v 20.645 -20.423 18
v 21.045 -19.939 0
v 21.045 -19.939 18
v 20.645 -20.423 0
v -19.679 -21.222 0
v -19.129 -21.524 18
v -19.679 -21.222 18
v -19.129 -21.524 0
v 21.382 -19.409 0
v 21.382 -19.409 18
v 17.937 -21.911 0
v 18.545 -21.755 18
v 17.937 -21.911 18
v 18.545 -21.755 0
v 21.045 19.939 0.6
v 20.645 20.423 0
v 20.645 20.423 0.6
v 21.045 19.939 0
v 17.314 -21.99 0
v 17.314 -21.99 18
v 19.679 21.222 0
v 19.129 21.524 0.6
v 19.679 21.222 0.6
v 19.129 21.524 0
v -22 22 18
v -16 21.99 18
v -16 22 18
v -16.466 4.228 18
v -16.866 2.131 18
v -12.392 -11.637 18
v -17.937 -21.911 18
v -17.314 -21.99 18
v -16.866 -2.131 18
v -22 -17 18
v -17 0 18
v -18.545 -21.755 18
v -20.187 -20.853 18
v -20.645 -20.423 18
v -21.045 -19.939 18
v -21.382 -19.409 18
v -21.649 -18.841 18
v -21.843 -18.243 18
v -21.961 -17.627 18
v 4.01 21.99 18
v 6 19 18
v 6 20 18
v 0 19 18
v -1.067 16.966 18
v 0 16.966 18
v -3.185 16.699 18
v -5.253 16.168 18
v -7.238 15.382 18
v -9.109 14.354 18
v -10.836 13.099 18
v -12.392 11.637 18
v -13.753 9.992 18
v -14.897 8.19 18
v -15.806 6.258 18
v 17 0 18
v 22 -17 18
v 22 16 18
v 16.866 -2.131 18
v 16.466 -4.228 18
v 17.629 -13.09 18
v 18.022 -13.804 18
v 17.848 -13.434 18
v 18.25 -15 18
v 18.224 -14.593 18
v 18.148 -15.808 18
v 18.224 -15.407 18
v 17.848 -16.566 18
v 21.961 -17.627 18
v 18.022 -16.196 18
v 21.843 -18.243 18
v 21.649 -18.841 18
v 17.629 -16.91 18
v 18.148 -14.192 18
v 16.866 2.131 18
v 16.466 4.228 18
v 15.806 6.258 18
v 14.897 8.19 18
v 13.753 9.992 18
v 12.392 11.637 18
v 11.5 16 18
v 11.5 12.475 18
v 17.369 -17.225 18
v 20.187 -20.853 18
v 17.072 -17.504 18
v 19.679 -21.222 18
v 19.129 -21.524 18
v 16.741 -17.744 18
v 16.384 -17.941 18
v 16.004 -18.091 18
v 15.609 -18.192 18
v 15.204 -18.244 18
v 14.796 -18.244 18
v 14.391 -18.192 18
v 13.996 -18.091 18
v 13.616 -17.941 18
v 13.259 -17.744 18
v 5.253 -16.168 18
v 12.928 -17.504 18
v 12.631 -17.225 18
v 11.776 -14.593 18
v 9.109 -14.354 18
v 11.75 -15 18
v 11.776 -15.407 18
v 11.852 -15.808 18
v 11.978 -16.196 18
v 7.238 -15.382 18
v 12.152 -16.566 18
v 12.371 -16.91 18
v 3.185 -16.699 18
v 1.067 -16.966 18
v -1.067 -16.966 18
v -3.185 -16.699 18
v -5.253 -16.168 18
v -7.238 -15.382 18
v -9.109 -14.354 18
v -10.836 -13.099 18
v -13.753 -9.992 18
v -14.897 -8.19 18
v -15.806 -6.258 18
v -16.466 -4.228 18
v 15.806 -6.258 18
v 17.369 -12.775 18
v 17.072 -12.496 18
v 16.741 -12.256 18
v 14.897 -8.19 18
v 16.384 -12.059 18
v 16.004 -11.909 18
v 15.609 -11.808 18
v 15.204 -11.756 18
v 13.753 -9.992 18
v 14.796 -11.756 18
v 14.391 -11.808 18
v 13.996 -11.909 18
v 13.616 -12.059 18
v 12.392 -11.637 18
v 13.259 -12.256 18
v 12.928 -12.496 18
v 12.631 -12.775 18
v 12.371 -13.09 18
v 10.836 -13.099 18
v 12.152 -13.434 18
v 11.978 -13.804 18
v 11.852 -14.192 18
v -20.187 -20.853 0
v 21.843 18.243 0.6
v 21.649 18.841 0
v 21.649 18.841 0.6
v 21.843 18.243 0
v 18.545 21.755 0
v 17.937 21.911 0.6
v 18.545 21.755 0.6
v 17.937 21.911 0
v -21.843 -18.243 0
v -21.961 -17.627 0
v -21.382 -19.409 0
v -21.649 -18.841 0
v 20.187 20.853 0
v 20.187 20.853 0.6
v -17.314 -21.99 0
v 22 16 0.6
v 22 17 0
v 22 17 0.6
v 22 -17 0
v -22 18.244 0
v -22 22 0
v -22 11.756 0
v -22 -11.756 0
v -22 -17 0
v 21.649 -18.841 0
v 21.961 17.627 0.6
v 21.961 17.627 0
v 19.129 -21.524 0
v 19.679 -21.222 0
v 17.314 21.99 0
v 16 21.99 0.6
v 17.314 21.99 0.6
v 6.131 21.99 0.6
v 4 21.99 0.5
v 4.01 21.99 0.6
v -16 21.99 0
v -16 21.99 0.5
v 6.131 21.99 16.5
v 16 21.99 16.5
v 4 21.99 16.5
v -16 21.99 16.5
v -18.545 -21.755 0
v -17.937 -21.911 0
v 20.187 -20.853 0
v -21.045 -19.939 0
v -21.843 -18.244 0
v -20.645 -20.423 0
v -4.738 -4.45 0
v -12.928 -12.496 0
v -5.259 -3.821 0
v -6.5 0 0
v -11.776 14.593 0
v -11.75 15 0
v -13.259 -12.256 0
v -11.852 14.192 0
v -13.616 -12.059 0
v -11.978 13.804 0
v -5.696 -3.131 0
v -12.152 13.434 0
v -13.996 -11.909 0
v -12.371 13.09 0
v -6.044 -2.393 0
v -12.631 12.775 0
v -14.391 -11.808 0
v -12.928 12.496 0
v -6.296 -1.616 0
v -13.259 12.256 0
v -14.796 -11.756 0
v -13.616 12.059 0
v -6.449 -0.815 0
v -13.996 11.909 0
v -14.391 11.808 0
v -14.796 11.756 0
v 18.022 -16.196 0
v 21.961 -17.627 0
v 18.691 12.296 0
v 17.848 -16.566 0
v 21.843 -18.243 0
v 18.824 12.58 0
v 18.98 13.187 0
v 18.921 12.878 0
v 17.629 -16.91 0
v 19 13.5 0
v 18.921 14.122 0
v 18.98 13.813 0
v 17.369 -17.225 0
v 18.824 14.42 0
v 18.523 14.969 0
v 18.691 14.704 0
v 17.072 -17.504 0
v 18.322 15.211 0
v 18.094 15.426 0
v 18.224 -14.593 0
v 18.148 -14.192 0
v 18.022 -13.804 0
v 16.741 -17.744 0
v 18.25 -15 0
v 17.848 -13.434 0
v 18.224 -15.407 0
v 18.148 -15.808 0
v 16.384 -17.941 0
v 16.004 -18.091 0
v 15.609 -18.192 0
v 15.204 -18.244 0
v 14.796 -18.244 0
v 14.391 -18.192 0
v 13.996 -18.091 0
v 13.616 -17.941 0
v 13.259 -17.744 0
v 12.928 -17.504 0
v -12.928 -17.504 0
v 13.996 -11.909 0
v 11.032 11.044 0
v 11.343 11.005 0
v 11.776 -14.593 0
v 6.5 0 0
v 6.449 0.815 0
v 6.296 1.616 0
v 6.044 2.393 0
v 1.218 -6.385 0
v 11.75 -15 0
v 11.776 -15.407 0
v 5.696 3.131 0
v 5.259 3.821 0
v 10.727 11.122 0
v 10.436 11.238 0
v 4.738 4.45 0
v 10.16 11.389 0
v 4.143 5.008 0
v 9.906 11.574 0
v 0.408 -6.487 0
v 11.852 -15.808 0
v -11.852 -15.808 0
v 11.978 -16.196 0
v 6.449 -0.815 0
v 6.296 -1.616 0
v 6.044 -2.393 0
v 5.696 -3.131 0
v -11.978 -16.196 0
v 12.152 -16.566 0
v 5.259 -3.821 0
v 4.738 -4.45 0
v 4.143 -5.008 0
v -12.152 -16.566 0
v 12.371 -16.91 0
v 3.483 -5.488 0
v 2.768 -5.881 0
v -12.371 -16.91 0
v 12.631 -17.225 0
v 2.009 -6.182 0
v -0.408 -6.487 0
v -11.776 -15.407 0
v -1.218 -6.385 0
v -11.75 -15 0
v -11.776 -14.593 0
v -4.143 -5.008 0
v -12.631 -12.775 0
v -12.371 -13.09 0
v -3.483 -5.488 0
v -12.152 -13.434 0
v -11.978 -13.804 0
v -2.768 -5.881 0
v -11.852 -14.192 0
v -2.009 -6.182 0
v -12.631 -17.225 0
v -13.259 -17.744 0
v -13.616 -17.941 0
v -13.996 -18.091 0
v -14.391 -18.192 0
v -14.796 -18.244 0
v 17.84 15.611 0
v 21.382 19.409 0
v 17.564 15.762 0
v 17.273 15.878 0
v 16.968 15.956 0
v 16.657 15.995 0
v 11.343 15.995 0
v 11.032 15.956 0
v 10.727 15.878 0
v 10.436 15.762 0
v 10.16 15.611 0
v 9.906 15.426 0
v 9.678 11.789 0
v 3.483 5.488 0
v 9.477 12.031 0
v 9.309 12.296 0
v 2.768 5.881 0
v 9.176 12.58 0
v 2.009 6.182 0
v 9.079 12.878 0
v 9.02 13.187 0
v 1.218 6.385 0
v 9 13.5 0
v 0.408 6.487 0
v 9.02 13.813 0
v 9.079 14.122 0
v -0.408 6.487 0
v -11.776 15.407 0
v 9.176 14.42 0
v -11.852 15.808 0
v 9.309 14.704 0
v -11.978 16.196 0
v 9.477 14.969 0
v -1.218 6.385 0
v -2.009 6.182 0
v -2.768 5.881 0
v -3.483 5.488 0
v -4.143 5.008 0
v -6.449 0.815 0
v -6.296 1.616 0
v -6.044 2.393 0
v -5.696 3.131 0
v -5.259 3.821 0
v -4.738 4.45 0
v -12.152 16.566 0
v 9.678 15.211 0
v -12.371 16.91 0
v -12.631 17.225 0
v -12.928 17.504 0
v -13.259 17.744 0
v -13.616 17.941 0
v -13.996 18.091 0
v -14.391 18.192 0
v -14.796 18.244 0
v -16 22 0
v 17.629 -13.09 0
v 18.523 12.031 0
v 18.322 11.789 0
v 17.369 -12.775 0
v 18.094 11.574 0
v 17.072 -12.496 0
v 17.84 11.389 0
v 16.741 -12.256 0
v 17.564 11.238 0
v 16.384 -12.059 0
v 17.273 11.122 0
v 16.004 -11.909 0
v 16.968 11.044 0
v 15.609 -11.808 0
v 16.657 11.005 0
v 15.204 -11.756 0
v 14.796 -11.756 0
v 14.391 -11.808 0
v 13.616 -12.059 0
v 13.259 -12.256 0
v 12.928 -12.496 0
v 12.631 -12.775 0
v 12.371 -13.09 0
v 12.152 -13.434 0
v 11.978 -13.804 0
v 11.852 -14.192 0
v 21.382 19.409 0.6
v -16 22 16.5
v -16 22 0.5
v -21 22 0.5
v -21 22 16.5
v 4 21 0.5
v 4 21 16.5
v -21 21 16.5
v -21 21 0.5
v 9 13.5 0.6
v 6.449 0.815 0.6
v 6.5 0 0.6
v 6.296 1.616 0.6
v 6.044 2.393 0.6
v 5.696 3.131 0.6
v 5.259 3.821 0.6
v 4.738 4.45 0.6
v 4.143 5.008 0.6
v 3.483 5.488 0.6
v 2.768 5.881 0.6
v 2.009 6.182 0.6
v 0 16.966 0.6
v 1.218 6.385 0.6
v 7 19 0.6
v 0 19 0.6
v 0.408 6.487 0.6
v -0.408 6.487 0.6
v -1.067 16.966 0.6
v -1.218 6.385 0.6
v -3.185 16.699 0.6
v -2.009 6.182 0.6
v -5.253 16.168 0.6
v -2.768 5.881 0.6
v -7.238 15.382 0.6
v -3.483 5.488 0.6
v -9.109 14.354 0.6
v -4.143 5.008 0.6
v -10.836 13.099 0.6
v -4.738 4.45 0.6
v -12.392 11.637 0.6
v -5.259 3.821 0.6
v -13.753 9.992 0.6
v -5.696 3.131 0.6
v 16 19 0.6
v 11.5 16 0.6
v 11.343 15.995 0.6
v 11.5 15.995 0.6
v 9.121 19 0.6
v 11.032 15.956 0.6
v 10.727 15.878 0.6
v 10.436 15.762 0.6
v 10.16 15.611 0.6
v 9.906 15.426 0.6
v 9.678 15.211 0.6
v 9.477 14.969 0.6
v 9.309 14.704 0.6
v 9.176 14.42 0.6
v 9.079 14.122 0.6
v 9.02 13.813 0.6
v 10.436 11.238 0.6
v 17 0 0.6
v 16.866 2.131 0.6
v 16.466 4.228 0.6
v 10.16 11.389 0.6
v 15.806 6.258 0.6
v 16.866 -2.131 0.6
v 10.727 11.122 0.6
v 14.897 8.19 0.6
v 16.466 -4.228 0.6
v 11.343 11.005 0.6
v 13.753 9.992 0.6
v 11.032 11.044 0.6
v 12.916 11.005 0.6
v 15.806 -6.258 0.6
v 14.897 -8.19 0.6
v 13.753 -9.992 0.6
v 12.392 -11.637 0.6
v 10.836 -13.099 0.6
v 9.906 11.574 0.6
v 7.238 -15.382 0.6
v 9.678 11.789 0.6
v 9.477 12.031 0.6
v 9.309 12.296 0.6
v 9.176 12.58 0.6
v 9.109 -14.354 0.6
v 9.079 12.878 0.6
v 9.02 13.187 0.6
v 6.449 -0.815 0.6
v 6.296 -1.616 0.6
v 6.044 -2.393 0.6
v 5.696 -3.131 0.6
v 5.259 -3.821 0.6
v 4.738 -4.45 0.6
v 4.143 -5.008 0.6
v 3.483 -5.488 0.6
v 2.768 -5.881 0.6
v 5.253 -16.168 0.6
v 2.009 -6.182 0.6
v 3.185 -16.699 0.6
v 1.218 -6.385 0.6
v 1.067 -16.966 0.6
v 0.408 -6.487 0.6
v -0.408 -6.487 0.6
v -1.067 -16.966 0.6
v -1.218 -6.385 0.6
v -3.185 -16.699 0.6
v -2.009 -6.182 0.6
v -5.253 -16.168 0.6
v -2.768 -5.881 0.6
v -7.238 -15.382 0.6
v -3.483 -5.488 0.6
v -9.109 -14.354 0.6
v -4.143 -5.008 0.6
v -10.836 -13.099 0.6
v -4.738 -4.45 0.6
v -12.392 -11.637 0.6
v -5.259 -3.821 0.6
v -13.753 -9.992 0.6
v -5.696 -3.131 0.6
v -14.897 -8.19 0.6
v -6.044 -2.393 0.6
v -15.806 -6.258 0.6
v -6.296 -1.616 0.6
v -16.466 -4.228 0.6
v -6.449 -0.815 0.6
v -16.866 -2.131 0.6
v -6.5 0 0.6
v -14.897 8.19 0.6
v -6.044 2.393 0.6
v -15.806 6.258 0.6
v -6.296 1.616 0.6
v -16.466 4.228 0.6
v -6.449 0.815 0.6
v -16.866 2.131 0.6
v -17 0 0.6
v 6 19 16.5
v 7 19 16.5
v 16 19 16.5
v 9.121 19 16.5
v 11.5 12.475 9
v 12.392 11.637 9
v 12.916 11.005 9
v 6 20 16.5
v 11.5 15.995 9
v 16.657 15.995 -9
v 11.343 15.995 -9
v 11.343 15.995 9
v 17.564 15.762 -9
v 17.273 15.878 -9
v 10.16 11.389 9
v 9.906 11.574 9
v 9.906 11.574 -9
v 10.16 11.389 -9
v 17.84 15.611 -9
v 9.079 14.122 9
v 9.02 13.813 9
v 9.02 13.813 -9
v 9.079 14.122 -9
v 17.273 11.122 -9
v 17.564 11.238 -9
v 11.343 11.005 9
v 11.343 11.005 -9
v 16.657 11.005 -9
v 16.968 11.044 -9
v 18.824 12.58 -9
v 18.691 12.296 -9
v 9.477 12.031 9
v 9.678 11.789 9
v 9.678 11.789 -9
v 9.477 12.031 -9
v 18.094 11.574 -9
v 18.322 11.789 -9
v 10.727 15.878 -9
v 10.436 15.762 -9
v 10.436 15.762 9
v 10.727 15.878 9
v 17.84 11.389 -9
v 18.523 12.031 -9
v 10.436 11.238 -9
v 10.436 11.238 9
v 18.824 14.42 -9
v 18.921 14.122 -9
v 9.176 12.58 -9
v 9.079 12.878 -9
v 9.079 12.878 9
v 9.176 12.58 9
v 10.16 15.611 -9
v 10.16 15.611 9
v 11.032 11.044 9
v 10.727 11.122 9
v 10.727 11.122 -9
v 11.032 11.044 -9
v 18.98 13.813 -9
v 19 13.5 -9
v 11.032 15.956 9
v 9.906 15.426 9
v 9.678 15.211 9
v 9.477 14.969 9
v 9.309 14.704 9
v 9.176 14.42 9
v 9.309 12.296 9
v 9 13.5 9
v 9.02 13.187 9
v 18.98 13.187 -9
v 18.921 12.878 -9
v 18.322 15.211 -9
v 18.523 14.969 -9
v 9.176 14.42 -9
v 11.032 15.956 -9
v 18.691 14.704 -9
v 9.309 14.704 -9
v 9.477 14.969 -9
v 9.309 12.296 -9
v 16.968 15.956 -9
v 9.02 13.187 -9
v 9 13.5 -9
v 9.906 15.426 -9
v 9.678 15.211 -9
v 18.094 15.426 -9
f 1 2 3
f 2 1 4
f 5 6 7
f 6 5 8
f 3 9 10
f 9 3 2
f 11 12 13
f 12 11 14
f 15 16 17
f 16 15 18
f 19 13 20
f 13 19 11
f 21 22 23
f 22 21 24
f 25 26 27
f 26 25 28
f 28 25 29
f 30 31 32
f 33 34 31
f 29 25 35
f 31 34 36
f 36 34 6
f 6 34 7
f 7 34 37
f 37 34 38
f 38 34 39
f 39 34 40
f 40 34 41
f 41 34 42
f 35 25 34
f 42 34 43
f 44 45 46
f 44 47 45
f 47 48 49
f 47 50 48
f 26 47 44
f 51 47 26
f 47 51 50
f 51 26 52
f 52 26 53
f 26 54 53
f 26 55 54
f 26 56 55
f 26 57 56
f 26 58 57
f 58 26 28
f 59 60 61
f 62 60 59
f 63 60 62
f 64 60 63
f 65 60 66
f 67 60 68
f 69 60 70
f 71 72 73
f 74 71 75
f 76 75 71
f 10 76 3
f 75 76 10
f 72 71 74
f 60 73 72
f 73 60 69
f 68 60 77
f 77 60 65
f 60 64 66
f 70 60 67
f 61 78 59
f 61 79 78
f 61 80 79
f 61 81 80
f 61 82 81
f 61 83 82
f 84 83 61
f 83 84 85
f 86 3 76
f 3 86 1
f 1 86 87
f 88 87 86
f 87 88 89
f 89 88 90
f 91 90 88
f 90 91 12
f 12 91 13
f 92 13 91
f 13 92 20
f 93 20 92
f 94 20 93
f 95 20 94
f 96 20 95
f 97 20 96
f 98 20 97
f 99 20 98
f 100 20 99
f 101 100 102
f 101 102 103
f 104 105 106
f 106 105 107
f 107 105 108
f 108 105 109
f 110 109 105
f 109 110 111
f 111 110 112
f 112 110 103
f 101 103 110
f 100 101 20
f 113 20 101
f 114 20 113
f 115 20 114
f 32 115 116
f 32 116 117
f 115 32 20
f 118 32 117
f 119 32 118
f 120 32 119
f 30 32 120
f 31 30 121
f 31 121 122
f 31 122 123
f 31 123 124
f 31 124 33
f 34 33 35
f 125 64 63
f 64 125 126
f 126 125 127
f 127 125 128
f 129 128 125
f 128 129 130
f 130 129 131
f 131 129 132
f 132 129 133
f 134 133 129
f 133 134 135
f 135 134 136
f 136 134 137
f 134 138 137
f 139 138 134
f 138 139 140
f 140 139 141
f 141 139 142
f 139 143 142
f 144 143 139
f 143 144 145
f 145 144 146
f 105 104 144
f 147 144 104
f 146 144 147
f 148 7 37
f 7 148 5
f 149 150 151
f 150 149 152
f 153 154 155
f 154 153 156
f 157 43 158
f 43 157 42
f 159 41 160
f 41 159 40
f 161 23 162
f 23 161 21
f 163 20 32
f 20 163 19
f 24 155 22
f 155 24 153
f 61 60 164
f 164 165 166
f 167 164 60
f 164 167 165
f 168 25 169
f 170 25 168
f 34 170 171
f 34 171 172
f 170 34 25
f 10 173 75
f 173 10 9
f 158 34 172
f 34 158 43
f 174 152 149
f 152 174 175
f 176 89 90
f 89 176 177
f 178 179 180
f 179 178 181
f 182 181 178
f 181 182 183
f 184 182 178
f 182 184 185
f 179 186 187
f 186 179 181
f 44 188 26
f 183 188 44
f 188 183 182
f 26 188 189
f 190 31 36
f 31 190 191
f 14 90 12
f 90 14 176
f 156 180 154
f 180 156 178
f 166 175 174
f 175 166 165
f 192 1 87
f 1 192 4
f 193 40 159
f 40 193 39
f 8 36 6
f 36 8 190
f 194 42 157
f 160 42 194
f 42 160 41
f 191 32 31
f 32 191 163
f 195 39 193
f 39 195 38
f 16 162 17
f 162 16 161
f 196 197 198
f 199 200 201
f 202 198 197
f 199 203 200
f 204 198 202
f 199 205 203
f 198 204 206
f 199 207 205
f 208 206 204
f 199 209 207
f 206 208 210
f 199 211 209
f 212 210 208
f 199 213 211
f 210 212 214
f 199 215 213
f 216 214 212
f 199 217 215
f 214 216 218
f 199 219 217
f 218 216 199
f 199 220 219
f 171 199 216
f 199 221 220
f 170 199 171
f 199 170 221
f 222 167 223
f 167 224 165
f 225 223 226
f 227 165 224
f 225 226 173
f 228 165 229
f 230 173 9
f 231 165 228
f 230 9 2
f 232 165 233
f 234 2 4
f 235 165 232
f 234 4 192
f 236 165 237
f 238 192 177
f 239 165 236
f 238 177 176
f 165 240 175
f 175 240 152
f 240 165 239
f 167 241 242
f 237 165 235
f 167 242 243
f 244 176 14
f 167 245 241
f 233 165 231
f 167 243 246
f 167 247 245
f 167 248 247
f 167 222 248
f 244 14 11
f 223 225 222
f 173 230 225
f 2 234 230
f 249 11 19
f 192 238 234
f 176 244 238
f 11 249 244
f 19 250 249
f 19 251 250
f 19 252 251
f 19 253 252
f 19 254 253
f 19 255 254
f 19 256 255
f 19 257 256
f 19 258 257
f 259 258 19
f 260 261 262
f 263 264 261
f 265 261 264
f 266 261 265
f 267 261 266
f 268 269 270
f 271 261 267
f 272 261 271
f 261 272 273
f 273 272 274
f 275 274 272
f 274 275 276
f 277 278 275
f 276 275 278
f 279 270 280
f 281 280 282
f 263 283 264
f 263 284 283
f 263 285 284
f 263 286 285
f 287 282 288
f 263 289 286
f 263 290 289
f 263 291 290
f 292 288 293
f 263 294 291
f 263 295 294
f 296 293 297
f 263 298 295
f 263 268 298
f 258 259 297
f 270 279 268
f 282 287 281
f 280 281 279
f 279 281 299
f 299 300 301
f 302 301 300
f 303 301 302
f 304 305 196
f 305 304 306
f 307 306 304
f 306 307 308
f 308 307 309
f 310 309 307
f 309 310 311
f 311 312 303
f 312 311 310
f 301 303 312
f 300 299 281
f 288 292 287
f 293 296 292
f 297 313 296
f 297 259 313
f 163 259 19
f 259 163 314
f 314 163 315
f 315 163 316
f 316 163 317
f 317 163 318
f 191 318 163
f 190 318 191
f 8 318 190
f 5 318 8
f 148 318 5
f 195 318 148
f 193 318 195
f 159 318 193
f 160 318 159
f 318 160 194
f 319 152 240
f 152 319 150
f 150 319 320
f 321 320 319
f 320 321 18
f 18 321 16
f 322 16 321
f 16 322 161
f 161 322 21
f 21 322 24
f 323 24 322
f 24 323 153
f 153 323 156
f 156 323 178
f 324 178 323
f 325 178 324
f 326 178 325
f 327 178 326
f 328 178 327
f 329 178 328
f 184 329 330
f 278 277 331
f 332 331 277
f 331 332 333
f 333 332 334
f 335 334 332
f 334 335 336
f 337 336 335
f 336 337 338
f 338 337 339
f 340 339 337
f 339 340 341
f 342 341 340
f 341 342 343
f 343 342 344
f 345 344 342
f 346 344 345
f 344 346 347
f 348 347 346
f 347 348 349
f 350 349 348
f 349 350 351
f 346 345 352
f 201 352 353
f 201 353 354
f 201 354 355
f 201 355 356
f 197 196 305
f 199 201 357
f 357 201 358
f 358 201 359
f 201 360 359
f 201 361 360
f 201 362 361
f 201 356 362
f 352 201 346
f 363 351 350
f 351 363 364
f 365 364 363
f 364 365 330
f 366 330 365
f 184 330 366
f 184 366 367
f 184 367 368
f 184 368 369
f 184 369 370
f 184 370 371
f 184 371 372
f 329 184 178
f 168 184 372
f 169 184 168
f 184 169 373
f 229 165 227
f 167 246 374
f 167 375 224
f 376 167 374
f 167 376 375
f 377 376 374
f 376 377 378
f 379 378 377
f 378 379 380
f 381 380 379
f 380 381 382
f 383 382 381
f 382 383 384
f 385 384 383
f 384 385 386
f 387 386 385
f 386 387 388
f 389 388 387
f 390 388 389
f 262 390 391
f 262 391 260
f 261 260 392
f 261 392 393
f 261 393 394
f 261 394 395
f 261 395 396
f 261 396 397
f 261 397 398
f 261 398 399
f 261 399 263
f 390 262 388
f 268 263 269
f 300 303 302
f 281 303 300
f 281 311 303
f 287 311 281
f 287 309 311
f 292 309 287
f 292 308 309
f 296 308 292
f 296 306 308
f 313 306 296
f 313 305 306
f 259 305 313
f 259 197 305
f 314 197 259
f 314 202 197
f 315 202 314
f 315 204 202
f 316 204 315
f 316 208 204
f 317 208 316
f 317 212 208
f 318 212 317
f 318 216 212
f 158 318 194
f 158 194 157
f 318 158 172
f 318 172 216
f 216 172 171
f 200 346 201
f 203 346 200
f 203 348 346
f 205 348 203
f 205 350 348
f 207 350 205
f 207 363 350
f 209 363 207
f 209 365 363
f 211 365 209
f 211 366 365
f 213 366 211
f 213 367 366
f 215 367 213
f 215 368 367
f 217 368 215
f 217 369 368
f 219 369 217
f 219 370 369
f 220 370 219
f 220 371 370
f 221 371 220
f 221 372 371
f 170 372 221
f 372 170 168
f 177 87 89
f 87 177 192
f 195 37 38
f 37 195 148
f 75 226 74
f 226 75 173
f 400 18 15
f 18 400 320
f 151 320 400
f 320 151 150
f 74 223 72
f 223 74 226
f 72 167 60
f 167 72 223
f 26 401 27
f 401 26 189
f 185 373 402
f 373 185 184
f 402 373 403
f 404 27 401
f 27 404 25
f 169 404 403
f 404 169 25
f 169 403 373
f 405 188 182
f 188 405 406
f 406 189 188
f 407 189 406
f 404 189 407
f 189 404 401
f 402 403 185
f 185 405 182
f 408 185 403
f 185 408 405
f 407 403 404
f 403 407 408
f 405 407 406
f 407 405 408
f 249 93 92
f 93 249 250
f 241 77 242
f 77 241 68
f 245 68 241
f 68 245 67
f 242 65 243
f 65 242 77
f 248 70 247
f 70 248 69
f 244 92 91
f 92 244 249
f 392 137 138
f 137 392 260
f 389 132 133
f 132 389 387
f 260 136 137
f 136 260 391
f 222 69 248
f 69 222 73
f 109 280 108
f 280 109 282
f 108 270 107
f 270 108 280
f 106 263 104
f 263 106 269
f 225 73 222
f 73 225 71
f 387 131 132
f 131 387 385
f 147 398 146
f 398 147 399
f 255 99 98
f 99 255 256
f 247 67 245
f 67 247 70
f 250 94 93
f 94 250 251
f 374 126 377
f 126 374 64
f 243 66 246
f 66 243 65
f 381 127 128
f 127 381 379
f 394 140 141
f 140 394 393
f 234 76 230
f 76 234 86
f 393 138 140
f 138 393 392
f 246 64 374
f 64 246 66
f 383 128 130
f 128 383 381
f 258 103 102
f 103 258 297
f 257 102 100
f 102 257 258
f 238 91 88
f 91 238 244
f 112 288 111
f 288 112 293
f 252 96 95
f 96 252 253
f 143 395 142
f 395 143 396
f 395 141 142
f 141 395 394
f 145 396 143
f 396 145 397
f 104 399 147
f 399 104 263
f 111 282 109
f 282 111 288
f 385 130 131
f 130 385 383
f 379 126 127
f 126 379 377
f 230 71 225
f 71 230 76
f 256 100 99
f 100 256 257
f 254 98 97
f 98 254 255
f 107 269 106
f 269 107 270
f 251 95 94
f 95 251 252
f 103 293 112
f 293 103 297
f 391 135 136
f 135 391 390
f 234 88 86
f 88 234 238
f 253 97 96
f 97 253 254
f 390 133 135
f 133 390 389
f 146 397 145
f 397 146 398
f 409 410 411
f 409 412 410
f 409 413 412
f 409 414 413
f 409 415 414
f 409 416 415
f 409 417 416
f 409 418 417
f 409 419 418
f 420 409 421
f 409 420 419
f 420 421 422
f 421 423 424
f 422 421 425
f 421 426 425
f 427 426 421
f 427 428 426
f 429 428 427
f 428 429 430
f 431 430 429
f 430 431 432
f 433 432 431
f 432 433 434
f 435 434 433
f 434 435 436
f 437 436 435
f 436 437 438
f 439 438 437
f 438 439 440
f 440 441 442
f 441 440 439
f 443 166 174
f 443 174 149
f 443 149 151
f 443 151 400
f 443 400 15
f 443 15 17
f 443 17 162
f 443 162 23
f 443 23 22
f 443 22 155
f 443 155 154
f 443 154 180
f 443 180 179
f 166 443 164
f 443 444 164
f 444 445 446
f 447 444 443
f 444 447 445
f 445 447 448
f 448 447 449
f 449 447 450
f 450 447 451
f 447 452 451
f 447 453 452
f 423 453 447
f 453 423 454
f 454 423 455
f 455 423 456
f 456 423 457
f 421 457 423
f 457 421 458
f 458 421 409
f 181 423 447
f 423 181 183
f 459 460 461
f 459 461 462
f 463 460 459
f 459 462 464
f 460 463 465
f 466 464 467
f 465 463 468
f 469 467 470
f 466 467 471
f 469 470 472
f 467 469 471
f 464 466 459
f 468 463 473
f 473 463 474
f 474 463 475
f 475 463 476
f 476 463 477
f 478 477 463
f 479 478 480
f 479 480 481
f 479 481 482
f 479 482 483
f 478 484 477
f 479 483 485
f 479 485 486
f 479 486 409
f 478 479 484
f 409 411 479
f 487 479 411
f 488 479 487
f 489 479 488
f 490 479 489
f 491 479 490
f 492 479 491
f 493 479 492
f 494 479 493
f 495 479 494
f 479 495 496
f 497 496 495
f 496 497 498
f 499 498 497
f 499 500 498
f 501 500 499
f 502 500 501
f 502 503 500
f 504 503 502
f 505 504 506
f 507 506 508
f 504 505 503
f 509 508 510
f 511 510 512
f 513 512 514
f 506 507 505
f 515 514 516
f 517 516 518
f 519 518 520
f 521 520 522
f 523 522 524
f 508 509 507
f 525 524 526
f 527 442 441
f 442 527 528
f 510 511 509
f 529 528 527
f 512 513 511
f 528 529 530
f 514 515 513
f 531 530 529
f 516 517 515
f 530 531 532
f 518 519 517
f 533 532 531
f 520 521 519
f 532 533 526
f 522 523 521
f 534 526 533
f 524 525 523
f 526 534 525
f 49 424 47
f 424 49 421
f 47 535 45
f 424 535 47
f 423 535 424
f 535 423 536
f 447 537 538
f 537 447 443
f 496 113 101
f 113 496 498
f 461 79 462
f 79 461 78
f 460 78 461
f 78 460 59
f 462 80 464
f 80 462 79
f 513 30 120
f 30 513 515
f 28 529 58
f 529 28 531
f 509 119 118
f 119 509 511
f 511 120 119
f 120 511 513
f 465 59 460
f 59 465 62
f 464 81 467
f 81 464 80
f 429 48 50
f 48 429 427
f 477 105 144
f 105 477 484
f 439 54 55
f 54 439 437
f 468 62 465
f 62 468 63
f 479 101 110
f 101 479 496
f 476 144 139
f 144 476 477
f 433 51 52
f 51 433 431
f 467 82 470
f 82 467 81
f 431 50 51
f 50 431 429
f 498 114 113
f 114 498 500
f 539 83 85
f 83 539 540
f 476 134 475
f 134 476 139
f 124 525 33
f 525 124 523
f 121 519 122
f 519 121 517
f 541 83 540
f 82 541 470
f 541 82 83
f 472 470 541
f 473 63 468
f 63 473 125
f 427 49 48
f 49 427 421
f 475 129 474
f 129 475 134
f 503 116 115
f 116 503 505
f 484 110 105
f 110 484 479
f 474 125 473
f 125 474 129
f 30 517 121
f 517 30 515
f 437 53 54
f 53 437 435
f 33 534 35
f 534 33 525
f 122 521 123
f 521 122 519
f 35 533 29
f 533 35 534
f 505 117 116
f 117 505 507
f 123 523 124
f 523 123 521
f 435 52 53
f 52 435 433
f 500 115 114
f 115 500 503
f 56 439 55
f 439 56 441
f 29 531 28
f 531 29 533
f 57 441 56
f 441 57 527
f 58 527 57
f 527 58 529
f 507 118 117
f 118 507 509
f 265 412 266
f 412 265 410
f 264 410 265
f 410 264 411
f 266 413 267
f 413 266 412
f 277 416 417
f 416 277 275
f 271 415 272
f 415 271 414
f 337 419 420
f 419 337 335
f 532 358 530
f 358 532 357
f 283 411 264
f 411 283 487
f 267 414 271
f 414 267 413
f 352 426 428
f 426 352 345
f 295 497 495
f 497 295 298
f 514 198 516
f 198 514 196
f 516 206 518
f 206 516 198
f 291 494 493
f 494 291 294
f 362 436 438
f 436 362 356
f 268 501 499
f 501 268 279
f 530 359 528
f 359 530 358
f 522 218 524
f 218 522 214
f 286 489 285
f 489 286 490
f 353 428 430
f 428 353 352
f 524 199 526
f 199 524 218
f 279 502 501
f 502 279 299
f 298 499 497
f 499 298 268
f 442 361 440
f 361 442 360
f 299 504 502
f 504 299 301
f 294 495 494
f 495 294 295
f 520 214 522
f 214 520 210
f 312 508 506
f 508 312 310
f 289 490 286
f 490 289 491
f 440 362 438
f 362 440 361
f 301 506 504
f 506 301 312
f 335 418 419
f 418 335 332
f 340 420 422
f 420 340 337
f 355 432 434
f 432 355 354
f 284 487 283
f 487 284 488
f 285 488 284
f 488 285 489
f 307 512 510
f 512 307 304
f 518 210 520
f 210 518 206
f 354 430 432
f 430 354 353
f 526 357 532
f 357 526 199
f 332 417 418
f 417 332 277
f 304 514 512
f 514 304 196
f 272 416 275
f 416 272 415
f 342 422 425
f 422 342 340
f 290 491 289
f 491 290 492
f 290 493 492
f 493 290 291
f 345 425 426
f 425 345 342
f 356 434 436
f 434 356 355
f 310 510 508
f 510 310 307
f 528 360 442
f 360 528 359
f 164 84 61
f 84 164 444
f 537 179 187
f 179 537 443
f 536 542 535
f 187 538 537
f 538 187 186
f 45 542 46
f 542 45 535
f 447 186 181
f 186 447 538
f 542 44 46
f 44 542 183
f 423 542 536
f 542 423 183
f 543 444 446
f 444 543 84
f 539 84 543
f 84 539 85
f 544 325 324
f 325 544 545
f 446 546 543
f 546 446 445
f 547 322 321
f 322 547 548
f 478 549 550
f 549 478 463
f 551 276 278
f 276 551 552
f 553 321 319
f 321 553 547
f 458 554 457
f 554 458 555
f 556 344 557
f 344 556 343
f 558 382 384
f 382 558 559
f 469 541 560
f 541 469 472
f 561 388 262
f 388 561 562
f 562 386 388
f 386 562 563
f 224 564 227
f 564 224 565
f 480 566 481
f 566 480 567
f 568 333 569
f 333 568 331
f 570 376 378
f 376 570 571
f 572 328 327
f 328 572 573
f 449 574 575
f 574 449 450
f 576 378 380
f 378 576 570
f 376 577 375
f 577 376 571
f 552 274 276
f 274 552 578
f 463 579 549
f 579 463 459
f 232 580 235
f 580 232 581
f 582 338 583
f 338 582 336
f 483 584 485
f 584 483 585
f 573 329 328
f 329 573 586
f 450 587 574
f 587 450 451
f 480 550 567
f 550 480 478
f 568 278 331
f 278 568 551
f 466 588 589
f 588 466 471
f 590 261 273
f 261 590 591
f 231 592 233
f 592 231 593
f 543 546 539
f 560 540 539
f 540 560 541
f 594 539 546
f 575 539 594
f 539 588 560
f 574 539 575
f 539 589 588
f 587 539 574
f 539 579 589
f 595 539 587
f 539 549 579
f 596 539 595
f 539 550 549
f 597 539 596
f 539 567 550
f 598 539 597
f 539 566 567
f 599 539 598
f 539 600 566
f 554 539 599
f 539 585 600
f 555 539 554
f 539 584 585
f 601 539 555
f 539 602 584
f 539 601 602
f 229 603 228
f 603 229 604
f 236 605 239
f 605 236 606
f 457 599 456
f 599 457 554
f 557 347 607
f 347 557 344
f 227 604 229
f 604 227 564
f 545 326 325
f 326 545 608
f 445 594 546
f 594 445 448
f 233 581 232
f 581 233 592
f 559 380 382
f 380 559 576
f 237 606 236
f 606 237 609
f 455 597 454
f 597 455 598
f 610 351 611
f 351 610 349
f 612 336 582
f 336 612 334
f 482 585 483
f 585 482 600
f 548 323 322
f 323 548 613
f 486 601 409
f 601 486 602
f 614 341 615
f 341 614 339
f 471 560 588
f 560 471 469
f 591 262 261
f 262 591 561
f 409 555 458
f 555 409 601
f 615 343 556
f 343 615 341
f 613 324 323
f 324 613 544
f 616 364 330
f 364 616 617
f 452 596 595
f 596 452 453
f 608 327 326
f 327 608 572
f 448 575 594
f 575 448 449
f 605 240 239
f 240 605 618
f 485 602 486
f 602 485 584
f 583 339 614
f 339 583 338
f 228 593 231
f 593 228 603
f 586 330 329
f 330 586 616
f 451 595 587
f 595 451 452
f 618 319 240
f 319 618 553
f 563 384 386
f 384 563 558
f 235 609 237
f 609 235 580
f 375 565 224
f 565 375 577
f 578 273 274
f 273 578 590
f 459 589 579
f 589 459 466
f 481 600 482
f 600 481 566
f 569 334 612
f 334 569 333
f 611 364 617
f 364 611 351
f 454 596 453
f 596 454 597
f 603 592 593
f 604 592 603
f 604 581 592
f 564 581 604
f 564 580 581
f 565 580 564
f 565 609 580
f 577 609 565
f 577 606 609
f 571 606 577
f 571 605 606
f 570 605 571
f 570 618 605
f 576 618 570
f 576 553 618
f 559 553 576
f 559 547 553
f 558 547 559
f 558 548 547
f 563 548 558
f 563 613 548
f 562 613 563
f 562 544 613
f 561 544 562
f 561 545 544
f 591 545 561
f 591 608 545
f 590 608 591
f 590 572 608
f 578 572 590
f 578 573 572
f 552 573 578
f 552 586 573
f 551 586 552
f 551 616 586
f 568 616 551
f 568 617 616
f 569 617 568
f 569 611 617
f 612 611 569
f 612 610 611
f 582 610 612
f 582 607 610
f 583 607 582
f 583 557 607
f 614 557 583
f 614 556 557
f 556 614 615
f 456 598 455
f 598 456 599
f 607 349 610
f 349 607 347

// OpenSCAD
$fn = 50;


union() {
	difference() {
		union() {
			hull() {
				translate(v = [-17.0000000000, 17.0000000000, 0]) {
					cylinder(h = 18, r = 5);
				}
				translate(v = [17.0000000000, 17.0000000000, 0]) {
					cylinder(h = 18, r = 5);
				}
				translate(v = [-17.0000000000, -17.0000000000, 0]) {
					cylinder(h = 18, r = 5);
				}
				translate(v = [17.0000000000, -17.0000000000, 0]) {
					cylinder(h = 18, r = 5);
				}
			}
			translate(v = [-22.0000000000, 16.0000000000, 0]) {
				cube(size = [6, 6, 18]);
			}
		}
		union() {
			translate(v = [-22.5000000000, -15.0000000000, -250.0000000000]) {
				rotate(a = [0, 0, 0]) {
					difference() {
						union() {
							hull() {
								translate(v = [7.5000000000, 0, 0]) {
									cylinder(h = 250, r = 3.2500000000, r1 = 3.2500000000, r2 = 3.2500000000);
								}
								translate(v = [-7.5000000000, 0, 0]) {
									cylinder(h = 250, r = 3.2500000000, r1 = 3.2500000000, r2 = 3.2500000000);
								}
							}
						}
						union();
					}
				}
			}
			translate(v = [-22.5000000000, 15.0000000000, -250.0000000000]) {
				rotate(a = [0, 0, 0]) {
					difference() {
						union() {
							hull() {
								translate(v = [7.5000000000, 0, 0]) {
									cylinder(h = 250, r = 3.2500000000, r1 = 3.2500000000, r2 = 3.2500000000);
								}
								translate(v = [-7.5000000000, 0, 0]) {
									cylinder(h = 250, r = 3.2500000000, r1 = 3.2500000000, r2 = 3.2500000000);
								}
							}
						}
						union();
					}
				}
			}
			translate(v = [-21.0000000000, 21.0000000000, 0.5000000000]) {
				cube(size = [25, 1, 16]);
			}
			translate(v = [15.0000000000, -15.0000000000, 0]) {
				cylinder(h = 100, r = 3.2500000000);
			}
			translate(v = [0.0000000000, 11.0000000000, 0.6000000000]) {
				cube(size = [11, 8, 20.4000000000]);
			}
			translate(v = [0, 0, 0.6000000000]) {
				cylinder(h = 20.4000000000, r = 17.0000000000);
			}
			translate(v = [0, 0, -9.0000000000]) {
				cylinder(h = 18, r = 6.5000000000);
			}
			translate(v = [0.0000000000, 16.0000000000, 0.6000000000]) {
				cube(size = [22.0000000000, 3, 20.4000000000]);
			}
			translate(v = [16.0000000000, 16.0000000000, 0.6000000000]) {
				cube(size = [6, 6, 20.4000000000]);
			}
			translate(v = [6.0000000000, 16.0000000000, 16.5000000000]) {
				cube(size = [16, 6, 1.5000000000]);
			}
			translate(v = [3.2500000000, 22.7500000000, 0.6000000000]) {
				rotate(a = [0, 0, -45]) {
					cube(size = [7.5000000000, 1.5000000000, 20.4000000000]);
				}
			}
			translate(v = [2.5000000000, 11.0000000000, 0.6000000000]) {
				cube(size = [9.0000000000, 5, 17.4000000000]);
			}
		}
	}
	union() {
		translate(v = [14, 13.5000000000, -9.0000000000]) {
			rotate(a = [0, 0, 0]) {
				difference() {
					union() {
						#hull() {
							#translate(v = [2.5000000000, 0, 0]) {
								cylinder(h = 18, r = 2.5000000000, r1 = 2.5000000000, r2 = 2.5000000000);
							}
							#translate(v = [-2.5000000000, 0, 0]) {
								cylinder(h = 18, r = 2.5000000000, r1 = 2.5000000000, r2 = 2.5000000000);
							}
						}
					}
					union();
				}
			}
		}
	}
}
